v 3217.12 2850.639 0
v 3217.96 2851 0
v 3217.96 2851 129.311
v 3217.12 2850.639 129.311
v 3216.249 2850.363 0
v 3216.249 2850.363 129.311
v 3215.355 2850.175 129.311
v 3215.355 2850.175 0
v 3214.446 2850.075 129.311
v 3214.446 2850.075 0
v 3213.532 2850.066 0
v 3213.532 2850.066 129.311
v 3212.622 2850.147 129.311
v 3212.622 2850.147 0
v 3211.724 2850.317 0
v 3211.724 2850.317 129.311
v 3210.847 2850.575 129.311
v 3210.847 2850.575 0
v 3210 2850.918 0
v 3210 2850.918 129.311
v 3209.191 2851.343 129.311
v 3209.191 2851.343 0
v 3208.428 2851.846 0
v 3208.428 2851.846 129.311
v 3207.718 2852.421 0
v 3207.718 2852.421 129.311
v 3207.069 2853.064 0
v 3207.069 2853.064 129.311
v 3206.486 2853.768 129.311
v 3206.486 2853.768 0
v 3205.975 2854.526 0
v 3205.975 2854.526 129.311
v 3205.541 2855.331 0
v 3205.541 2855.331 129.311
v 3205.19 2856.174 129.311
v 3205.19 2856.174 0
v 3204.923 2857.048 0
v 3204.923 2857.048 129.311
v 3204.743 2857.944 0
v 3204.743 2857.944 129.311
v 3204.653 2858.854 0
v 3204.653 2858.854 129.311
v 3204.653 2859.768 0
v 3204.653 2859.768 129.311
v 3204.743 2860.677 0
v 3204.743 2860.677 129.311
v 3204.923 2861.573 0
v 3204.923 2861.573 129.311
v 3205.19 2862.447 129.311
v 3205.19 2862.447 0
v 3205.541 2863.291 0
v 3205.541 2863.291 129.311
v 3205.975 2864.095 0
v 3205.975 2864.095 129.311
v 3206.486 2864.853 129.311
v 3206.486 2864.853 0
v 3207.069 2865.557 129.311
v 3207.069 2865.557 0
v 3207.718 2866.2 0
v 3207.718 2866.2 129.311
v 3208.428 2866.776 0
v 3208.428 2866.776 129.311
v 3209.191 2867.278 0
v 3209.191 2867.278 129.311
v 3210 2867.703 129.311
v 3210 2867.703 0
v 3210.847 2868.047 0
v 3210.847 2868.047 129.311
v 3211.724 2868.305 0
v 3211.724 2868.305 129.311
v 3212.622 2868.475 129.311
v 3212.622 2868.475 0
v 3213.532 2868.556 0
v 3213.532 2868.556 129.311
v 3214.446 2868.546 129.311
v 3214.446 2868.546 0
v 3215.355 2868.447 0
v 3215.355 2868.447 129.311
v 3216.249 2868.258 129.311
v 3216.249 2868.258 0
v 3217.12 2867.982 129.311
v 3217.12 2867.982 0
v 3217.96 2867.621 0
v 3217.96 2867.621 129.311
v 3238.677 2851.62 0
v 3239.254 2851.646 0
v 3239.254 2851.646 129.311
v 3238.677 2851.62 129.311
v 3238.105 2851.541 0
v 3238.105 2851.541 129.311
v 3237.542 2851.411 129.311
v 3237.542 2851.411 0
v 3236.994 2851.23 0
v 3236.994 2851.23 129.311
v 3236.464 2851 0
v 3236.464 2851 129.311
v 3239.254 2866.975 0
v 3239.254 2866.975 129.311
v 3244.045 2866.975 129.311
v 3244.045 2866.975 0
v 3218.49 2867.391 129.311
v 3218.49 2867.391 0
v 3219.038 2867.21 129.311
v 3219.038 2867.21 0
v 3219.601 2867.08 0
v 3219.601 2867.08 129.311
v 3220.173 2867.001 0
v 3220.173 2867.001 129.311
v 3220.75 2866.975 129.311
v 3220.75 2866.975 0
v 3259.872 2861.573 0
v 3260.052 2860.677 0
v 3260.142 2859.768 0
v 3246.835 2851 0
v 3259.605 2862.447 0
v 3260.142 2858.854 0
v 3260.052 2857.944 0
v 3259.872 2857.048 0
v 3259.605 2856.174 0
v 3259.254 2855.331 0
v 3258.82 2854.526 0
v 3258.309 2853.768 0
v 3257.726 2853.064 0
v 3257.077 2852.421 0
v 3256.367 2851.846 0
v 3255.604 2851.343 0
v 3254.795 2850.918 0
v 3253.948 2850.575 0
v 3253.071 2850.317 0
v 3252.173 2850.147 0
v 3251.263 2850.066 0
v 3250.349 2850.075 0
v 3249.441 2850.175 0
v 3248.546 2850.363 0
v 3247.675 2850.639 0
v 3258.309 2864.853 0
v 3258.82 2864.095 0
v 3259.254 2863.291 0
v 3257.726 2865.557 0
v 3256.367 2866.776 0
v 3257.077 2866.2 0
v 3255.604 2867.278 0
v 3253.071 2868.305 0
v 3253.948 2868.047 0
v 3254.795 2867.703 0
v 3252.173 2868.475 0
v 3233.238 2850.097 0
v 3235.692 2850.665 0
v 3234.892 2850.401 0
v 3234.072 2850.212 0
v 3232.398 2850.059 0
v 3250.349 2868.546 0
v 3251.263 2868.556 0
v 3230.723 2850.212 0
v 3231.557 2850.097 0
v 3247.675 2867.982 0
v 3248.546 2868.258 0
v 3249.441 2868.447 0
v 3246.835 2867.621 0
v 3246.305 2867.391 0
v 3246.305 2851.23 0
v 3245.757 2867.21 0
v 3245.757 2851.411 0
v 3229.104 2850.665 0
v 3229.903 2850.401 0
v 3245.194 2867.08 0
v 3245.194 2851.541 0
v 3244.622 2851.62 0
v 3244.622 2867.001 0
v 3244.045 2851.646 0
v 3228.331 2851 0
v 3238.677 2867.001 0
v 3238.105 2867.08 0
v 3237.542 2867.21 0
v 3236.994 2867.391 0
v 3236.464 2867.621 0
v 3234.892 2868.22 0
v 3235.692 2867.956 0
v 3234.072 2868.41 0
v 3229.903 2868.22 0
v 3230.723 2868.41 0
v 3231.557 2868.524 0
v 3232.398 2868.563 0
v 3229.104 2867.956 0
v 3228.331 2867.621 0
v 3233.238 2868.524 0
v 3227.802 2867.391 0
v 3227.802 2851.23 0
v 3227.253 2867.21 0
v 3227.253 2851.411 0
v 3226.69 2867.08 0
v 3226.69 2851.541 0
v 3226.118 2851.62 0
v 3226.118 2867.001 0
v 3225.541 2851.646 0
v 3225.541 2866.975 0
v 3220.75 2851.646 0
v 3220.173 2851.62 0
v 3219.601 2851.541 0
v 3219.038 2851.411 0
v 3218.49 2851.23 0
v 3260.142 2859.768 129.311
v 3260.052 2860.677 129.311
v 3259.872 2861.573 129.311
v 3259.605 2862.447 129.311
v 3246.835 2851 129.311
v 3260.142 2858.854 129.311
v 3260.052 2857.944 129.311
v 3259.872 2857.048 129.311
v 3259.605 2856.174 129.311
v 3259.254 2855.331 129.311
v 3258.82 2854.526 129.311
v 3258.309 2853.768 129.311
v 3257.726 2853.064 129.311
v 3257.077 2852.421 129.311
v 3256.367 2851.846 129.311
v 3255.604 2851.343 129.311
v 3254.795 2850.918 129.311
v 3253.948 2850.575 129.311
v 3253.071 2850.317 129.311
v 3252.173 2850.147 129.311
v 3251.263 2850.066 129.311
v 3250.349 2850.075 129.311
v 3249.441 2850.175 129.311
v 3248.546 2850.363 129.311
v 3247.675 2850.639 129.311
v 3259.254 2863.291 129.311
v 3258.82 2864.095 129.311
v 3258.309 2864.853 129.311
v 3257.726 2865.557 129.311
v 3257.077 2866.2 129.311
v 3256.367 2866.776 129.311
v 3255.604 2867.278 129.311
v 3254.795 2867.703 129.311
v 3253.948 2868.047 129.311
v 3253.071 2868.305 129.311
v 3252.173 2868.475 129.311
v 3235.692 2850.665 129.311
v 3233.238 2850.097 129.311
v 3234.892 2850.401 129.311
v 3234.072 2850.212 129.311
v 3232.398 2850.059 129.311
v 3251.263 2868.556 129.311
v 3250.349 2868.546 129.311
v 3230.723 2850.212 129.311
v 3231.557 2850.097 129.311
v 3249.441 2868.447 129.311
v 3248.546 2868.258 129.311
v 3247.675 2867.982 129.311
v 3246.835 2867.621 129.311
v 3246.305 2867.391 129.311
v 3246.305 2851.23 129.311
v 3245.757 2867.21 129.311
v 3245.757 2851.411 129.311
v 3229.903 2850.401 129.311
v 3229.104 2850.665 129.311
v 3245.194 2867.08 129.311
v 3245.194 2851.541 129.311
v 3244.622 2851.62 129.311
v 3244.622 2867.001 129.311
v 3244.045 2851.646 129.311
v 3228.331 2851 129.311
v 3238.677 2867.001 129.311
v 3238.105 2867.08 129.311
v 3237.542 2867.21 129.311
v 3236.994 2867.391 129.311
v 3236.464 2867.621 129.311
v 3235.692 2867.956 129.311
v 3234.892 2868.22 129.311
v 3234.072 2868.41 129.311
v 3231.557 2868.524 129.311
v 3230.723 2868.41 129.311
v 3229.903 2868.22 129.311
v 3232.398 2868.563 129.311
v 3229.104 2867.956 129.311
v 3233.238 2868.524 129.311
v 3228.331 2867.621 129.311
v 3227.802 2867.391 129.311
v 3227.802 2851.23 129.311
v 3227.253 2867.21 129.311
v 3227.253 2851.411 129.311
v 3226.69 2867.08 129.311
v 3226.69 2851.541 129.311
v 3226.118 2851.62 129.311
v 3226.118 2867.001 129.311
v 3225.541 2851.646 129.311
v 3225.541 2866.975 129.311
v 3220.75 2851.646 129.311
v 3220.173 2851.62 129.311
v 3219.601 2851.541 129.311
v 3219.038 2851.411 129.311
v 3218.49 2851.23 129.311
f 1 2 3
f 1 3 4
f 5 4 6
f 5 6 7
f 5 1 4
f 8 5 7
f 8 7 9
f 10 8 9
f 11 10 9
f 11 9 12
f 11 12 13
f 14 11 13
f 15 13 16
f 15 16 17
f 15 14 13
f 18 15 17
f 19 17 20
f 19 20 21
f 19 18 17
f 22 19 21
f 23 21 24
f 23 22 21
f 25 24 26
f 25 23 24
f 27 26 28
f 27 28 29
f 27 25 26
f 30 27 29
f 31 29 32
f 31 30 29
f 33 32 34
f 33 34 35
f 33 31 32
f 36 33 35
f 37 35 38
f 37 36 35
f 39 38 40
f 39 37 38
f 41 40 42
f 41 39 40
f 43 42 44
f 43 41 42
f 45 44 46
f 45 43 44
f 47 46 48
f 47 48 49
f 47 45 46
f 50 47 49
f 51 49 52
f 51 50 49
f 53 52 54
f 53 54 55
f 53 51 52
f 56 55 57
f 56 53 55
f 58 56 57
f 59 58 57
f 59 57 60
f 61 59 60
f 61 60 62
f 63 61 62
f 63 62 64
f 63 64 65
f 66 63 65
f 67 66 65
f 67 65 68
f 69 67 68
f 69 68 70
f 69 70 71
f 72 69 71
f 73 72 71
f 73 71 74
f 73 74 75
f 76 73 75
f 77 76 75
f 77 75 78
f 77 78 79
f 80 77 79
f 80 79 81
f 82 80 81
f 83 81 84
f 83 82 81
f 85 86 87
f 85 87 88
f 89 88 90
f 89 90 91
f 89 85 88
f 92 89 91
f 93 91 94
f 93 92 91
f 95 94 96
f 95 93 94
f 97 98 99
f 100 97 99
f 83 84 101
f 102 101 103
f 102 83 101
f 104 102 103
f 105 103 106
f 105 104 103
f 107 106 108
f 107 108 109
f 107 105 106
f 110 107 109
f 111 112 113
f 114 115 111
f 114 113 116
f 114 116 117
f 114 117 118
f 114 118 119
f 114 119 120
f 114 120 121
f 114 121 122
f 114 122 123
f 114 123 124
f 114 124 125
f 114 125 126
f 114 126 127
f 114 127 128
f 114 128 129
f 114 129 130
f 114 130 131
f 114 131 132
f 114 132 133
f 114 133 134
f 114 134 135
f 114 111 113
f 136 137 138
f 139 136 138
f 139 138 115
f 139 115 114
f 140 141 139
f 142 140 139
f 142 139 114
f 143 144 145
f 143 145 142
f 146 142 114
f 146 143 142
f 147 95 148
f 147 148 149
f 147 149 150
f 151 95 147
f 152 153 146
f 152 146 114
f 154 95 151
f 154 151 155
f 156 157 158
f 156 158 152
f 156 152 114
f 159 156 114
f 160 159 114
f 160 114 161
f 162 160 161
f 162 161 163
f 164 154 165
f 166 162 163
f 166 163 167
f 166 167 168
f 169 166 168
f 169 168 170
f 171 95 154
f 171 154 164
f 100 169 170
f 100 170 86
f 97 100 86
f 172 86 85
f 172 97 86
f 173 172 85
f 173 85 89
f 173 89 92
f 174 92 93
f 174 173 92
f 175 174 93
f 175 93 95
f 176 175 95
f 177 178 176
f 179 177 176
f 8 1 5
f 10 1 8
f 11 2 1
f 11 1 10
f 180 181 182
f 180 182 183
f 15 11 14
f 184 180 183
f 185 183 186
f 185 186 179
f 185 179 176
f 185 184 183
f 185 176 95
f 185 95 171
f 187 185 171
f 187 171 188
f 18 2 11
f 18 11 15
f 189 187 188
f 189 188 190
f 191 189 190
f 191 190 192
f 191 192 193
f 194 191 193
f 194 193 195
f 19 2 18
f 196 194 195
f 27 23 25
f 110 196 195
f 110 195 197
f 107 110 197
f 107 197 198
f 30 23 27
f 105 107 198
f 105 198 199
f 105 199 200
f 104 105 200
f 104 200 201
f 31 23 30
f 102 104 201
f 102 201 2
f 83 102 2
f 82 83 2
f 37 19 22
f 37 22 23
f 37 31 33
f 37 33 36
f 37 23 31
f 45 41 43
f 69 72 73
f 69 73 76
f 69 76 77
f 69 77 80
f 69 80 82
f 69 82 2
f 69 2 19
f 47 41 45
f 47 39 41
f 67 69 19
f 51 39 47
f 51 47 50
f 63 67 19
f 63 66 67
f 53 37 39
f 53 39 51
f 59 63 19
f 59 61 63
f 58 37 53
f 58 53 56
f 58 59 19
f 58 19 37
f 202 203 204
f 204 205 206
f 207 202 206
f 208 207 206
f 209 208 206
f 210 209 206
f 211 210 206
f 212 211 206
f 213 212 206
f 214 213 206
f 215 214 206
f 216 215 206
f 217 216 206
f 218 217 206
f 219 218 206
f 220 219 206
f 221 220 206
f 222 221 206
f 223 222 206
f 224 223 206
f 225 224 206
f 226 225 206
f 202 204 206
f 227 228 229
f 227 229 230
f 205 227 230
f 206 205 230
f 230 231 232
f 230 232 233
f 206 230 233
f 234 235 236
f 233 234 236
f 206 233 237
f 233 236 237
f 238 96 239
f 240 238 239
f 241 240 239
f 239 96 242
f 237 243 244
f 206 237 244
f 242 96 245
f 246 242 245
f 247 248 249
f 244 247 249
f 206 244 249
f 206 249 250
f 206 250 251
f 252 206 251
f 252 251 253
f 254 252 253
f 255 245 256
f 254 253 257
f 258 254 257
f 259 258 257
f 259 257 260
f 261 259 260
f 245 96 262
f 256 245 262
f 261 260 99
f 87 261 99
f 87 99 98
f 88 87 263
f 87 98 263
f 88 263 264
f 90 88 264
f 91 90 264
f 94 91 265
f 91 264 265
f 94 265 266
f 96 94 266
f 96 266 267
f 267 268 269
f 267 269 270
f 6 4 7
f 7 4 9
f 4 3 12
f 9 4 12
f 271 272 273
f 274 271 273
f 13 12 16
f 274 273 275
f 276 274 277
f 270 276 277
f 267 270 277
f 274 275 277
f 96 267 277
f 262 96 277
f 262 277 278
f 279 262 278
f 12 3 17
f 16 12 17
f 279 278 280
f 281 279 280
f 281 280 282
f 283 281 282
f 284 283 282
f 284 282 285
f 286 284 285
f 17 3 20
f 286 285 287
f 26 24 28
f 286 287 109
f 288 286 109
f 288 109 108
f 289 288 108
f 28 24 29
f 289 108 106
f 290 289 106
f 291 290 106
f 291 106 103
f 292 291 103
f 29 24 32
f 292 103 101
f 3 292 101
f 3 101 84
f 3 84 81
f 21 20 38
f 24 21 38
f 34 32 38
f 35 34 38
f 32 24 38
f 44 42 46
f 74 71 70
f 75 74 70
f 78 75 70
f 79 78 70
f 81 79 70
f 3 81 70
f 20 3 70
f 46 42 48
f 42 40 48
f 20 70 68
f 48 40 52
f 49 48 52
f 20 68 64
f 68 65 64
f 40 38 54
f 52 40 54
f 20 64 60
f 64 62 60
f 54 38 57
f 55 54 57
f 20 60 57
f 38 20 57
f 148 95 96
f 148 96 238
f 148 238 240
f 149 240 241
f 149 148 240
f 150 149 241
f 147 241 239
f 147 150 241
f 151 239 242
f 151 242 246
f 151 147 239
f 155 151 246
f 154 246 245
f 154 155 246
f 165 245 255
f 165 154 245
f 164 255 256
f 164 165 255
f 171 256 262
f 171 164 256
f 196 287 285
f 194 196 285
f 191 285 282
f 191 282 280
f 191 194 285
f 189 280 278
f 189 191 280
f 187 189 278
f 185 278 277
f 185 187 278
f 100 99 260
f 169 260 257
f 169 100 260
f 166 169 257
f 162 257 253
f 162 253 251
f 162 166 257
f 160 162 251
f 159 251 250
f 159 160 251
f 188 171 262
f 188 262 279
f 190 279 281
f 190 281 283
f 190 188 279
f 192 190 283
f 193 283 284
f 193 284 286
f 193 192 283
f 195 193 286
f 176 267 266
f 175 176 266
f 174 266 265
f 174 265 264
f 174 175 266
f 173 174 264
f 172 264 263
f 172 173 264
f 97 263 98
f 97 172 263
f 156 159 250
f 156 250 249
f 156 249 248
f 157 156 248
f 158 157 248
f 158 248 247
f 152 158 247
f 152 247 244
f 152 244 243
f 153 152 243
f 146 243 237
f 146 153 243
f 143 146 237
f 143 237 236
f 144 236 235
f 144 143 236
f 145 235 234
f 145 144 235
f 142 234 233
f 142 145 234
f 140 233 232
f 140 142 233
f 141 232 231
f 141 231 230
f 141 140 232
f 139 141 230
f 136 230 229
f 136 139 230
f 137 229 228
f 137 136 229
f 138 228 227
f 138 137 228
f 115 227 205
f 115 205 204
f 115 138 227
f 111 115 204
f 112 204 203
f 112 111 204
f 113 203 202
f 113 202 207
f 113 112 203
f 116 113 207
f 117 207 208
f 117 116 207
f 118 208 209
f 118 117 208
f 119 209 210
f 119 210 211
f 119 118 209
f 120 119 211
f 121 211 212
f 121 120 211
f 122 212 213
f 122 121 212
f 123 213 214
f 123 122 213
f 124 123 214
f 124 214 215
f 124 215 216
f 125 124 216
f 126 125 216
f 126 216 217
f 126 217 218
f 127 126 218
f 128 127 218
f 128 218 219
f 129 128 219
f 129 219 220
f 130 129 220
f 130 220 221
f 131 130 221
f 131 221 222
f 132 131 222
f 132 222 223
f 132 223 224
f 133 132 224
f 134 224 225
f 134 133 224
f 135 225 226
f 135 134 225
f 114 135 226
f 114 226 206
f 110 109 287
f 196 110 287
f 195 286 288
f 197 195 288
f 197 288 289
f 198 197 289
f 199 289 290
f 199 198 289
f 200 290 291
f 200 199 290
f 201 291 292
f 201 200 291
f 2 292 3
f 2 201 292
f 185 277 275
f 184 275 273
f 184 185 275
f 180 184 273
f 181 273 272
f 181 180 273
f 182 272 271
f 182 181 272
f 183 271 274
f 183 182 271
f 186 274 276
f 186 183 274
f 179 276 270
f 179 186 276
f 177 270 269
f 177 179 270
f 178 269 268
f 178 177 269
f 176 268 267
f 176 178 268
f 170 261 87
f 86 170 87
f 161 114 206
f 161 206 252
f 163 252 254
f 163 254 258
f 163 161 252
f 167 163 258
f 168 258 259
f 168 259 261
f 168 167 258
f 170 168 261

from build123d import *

# Parameters (mm, degrees)
BOSS_EXTRUDE1_DEPTH = 129.3114


with BuildPart() as part:
    # Sketch1 → Boss-Extrude1 (new body)
    with BuildSketch(Plane.XY):
        with BuildLine():
            Line((3220.750449704, 2866.97511019), (3225.540701758, 2866.97511019))
            ThreePointArc((3225.540701758, 2866.97511019), (3226.972975907, 2867.138746899), (3228.331431905, 2867.621223336))
            ThreePointArc((3228.331431905, 2867.621223336), (3232.397525731, 2868.56261019), (3236.463619556, 2867.621223336))
            ThreePointArc((3236.463619556, 2867.621223336), (3237.822075555, 2867.138746899), (3239.254349704, 2866.97511019))
            Line((3239.254349704, 2866.97511019), (3244.044601758, 2866.97511019))
            ThreePointArc((3244.044601758, 2866.97511019), (3245.476875907, 2867.138746899), (3246.835331905, 2867.621223336))
            ThreePointArc((3246.835331905, 2867.621223336), (3260.153375731, 2859.31066019), (3246.835331905, 2851.000097044))
            ThreePointArc((3246.835331905, 2851.000097044), (3245.476875907, 2851.48257348), (3244.044601758, 2851.64621019))
            Line((3244.044601758, 2851.64621019), (3239.254349704, 2851.64621019))
            ThreePointArc((3239.254349704, 2851.64621019), (3237.822075555, 2851.48257348), (3236.463619556, 2851.000097044))
            ThreePointArc((3236.463619556, 2851.000097044), (3232.397525731, 2850.05871019), (3228.331431905, 2851.000097044))
            ThreePointArc((3228.331431905, 2851.000097044), (3226.972975907, 2851.48257348), (3225.540701758, 2851.64621019))
            Line((3225.540701758, 2851.64621019), (3220.750449704, 2851.64621019))
            ThreePointArc((3220.750449704, 2851.64621019), (3219.318175555, 2851.48257348), (3217.959719556, 2851.000097044))
            ThreePointArc((3217.959719556, 2851.000097044), (3204.641675731, 2859.31066019), (3217.959719556, 2867.621223336))
            ThreePointArc((3217.959719556, 2867.621223336), (3219.318175555, 2867.138746899), (3220.750449704, 2866.97511019))
        make_face()
    extrude(amount=BOSS_EXTRUDE1_DEPTH)


solid = part.part
